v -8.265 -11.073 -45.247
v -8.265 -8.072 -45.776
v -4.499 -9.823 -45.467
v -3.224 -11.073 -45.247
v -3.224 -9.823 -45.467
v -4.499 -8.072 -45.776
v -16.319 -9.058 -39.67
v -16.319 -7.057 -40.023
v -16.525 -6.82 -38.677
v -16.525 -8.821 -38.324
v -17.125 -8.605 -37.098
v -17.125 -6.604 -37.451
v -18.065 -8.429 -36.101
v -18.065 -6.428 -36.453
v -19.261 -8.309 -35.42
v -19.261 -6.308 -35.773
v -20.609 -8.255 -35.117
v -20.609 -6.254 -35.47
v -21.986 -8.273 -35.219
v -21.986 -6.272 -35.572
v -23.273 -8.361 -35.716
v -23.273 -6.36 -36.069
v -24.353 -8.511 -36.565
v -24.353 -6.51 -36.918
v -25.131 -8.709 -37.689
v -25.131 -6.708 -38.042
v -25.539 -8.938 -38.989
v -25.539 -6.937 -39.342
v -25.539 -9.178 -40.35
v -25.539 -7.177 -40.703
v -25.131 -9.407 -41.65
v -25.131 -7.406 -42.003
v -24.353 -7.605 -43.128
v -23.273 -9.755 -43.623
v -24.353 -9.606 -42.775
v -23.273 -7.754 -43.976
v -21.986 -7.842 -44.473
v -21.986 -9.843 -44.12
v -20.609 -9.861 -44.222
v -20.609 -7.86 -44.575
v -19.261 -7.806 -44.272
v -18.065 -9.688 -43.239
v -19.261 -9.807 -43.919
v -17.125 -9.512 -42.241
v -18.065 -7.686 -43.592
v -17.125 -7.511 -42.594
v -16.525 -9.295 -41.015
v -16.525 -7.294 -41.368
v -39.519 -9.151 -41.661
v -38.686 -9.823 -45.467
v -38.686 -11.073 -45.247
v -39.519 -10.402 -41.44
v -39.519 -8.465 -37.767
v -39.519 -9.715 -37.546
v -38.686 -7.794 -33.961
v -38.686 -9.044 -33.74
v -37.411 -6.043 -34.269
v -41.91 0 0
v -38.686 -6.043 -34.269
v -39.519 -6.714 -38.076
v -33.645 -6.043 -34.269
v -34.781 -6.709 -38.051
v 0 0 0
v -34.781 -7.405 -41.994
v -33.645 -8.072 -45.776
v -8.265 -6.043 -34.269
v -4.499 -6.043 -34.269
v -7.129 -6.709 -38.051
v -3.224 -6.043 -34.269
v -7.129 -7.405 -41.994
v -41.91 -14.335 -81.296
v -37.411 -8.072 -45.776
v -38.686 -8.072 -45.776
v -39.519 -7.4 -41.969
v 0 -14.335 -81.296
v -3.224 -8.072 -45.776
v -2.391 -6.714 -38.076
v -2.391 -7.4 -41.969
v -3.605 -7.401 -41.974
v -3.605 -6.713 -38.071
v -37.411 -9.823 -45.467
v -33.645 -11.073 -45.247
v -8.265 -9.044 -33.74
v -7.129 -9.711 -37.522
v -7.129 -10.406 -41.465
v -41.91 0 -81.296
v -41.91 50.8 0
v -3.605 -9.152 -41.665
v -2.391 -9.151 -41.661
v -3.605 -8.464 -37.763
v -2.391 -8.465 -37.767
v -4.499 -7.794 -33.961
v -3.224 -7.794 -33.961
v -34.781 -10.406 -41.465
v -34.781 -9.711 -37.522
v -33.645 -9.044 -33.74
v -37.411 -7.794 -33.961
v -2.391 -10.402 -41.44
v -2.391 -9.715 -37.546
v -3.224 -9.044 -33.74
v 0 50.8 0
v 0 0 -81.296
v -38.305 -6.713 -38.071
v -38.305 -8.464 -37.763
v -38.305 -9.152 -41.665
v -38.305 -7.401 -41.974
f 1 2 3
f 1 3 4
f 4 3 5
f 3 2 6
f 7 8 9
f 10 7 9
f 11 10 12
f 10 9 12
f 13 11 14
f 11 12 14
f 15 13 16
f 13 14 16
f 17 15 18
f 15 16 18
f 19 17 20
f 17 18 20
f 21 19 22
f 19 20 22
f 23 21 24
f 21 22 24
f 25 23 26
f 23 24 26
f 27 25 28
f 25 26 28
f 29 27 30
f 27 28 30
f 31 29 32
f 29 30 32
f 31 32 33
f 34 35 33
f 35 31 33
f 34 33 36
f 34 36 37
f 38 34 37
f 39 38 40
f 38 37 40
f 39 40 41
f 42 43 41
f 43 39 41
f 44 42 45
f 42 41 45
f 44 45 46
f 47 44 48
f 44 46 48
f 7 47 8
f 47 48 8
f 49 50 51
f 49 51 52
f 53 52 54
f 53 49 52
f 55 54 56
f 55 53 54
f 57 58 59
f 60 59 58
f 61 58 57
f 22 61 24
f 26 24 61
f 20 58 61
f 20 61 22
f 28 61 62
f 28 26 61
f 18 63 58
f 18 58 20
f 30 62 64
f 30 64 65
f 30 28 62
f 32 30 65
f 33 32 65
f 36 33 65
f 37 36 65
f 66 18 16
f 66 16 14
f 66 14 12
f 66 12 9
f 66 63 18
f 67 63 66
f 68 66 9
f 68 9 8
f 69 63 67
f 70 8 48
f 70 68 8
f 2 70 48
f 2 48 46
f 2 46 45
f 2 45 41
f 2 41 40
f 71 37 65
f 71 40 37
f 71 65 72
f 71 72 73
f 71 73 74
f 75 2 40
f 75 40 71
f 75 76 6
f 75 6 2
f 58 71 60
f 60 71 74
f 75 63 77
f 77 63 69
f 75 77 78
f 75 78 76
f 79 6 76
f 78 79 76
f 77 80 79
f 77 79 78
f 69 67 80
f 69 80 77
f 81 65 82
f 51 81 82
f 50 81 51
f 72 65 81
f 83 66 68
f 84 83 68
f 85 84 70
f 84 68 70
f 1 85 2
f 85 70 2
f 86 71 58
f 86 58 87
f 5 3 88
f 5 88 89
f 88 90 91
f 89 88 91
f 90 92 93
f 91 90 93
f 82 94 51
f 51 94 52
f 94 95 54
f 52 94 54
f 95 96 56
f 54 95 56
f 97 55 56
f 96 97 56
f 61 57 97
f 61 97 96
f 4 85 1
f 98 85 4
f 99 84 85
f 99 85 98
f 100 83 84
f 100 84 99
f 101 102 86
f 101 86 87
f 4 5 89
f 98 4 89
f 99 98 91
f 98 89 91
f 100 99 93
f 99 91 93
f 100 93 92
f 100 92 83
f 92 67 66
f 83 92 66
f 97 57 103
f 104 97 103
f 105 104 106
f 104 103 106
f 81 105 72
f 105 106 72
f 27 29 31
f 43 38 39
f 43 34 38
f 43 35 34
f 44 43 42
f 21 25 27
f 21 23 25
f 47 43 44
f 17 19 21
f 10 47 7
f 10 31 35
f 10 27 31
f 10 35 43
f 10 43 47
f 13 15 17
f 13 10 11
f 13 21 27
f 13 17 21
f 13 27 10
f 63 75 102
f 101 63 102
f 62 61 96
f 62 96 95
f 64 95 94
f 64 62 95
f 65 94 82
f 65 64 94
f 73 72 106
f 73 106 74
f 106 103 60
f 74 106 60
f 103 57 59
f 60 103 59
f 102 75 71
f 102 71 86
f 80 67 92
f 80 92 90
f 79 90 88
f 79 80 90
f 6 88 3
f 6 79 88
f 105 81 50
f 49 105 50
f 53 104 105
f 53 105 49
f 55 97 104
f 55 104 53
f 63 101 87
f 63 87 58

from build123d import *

# Parameters (mm, degrees)
F1_DEPTH = 41.91
F2_R     = 4.6355
F3_DEPTH = 2.032
F4_DEPTH = 3.048
F5_DEPTH = 1.778


with BuildPart() as f1:
    # F0 (on Right) → F1 (new body)
    with BuildSketch(Plane.YZ):
        Polygon((50.8, 0), (0, 0), (-14.3346570664, -81.2958800112), (0, -81.2958800112), align=None)
    extrude(amount=-F1_DEPTH)

    # F2 (on face) → F3 (join)
    with BuildSketch(Plane(origin=(0, 0, 0), x_dir=(1, 0, 0), z_dir=(0, -0.984807753, 0.1736481777))):
        with Locations((-20.955, -40.64)):
            Circle(F2_R)
    extrude(amount=F3_DEPTH)

    # F2 (on face) → F4 (join)
    with BuildSketch(Plane(origin=(0, 0, 0), x_dir=(1, 0, 0), z_dir=(0, -0.984807753, 0.1736481777))):
        with BuildLine():
            ThreePointArc((-8.2651640673, -34.798), (-6.985, -40.64), (-8.2651640673, -46.482))
            Line((-8.2651640673, -46.482), (-4.4986959724, -46.482))
            ThreePointArc((-4.4986959724, -46.482), (-3.4925, -40.64), (-4.4986959724, -34.798))
            Line((-4.4986959724, -34.798), (-8.2651640673, -34.798))
        make_face()
        with BuildLine():
            ThreePointArc((-4.4986959724, -34.798), (-3.4925, -40.64), (-4.4986959724, -46.482))
            Line((-4.4986959724, -46.482), (-3.2235985607, -46.482))
            ThreePointArc((-3.2235985607, -46.482), (-2.286, -40.64), (-3.2235985607, -34.798))
            Line((-3.2235985607, -34.798), (-4.4986959724, -34.798))
        make_face()
    extrude(amount=F4_DEPTH)

    # F2 (on face) → F5 (cut)
    with BuildSketch(Plane(origin=(0, 0, 0), x_dir=(1, 0, 0), z_dir=(0, -0.984807753, 0.1736481777))):
        with BuildLine():
            ThreePointArc((-4.4986959724, -34.798), (-3.4925, -40.64), (-4.4986959724, -46.482))
            Line((-4.4986959724, -46.482), (-3.2235985607, -46.482))
            ThreePointArc((-3.2235985607, -46.482), (-2.286, -40.64), (-3.2235985607, -34.798))
            Line((-3.2235985607, -34.798), (-4.4986959724, -34.798))
        make_face()
    extrude(amount=F5_DEPTH, mode=Mode.SUBTRACT)

    # F7: F1 across plane


with BuildPart() as f1_1:
    add(f1.part)
    add(f1.part.mirror(Plane(origin=(-20.955, 12.1551143112, -33.0624182644), x_dir=(0, 1, 0), z_dir=(1, 0, 0))))


solid = f1_1.part
